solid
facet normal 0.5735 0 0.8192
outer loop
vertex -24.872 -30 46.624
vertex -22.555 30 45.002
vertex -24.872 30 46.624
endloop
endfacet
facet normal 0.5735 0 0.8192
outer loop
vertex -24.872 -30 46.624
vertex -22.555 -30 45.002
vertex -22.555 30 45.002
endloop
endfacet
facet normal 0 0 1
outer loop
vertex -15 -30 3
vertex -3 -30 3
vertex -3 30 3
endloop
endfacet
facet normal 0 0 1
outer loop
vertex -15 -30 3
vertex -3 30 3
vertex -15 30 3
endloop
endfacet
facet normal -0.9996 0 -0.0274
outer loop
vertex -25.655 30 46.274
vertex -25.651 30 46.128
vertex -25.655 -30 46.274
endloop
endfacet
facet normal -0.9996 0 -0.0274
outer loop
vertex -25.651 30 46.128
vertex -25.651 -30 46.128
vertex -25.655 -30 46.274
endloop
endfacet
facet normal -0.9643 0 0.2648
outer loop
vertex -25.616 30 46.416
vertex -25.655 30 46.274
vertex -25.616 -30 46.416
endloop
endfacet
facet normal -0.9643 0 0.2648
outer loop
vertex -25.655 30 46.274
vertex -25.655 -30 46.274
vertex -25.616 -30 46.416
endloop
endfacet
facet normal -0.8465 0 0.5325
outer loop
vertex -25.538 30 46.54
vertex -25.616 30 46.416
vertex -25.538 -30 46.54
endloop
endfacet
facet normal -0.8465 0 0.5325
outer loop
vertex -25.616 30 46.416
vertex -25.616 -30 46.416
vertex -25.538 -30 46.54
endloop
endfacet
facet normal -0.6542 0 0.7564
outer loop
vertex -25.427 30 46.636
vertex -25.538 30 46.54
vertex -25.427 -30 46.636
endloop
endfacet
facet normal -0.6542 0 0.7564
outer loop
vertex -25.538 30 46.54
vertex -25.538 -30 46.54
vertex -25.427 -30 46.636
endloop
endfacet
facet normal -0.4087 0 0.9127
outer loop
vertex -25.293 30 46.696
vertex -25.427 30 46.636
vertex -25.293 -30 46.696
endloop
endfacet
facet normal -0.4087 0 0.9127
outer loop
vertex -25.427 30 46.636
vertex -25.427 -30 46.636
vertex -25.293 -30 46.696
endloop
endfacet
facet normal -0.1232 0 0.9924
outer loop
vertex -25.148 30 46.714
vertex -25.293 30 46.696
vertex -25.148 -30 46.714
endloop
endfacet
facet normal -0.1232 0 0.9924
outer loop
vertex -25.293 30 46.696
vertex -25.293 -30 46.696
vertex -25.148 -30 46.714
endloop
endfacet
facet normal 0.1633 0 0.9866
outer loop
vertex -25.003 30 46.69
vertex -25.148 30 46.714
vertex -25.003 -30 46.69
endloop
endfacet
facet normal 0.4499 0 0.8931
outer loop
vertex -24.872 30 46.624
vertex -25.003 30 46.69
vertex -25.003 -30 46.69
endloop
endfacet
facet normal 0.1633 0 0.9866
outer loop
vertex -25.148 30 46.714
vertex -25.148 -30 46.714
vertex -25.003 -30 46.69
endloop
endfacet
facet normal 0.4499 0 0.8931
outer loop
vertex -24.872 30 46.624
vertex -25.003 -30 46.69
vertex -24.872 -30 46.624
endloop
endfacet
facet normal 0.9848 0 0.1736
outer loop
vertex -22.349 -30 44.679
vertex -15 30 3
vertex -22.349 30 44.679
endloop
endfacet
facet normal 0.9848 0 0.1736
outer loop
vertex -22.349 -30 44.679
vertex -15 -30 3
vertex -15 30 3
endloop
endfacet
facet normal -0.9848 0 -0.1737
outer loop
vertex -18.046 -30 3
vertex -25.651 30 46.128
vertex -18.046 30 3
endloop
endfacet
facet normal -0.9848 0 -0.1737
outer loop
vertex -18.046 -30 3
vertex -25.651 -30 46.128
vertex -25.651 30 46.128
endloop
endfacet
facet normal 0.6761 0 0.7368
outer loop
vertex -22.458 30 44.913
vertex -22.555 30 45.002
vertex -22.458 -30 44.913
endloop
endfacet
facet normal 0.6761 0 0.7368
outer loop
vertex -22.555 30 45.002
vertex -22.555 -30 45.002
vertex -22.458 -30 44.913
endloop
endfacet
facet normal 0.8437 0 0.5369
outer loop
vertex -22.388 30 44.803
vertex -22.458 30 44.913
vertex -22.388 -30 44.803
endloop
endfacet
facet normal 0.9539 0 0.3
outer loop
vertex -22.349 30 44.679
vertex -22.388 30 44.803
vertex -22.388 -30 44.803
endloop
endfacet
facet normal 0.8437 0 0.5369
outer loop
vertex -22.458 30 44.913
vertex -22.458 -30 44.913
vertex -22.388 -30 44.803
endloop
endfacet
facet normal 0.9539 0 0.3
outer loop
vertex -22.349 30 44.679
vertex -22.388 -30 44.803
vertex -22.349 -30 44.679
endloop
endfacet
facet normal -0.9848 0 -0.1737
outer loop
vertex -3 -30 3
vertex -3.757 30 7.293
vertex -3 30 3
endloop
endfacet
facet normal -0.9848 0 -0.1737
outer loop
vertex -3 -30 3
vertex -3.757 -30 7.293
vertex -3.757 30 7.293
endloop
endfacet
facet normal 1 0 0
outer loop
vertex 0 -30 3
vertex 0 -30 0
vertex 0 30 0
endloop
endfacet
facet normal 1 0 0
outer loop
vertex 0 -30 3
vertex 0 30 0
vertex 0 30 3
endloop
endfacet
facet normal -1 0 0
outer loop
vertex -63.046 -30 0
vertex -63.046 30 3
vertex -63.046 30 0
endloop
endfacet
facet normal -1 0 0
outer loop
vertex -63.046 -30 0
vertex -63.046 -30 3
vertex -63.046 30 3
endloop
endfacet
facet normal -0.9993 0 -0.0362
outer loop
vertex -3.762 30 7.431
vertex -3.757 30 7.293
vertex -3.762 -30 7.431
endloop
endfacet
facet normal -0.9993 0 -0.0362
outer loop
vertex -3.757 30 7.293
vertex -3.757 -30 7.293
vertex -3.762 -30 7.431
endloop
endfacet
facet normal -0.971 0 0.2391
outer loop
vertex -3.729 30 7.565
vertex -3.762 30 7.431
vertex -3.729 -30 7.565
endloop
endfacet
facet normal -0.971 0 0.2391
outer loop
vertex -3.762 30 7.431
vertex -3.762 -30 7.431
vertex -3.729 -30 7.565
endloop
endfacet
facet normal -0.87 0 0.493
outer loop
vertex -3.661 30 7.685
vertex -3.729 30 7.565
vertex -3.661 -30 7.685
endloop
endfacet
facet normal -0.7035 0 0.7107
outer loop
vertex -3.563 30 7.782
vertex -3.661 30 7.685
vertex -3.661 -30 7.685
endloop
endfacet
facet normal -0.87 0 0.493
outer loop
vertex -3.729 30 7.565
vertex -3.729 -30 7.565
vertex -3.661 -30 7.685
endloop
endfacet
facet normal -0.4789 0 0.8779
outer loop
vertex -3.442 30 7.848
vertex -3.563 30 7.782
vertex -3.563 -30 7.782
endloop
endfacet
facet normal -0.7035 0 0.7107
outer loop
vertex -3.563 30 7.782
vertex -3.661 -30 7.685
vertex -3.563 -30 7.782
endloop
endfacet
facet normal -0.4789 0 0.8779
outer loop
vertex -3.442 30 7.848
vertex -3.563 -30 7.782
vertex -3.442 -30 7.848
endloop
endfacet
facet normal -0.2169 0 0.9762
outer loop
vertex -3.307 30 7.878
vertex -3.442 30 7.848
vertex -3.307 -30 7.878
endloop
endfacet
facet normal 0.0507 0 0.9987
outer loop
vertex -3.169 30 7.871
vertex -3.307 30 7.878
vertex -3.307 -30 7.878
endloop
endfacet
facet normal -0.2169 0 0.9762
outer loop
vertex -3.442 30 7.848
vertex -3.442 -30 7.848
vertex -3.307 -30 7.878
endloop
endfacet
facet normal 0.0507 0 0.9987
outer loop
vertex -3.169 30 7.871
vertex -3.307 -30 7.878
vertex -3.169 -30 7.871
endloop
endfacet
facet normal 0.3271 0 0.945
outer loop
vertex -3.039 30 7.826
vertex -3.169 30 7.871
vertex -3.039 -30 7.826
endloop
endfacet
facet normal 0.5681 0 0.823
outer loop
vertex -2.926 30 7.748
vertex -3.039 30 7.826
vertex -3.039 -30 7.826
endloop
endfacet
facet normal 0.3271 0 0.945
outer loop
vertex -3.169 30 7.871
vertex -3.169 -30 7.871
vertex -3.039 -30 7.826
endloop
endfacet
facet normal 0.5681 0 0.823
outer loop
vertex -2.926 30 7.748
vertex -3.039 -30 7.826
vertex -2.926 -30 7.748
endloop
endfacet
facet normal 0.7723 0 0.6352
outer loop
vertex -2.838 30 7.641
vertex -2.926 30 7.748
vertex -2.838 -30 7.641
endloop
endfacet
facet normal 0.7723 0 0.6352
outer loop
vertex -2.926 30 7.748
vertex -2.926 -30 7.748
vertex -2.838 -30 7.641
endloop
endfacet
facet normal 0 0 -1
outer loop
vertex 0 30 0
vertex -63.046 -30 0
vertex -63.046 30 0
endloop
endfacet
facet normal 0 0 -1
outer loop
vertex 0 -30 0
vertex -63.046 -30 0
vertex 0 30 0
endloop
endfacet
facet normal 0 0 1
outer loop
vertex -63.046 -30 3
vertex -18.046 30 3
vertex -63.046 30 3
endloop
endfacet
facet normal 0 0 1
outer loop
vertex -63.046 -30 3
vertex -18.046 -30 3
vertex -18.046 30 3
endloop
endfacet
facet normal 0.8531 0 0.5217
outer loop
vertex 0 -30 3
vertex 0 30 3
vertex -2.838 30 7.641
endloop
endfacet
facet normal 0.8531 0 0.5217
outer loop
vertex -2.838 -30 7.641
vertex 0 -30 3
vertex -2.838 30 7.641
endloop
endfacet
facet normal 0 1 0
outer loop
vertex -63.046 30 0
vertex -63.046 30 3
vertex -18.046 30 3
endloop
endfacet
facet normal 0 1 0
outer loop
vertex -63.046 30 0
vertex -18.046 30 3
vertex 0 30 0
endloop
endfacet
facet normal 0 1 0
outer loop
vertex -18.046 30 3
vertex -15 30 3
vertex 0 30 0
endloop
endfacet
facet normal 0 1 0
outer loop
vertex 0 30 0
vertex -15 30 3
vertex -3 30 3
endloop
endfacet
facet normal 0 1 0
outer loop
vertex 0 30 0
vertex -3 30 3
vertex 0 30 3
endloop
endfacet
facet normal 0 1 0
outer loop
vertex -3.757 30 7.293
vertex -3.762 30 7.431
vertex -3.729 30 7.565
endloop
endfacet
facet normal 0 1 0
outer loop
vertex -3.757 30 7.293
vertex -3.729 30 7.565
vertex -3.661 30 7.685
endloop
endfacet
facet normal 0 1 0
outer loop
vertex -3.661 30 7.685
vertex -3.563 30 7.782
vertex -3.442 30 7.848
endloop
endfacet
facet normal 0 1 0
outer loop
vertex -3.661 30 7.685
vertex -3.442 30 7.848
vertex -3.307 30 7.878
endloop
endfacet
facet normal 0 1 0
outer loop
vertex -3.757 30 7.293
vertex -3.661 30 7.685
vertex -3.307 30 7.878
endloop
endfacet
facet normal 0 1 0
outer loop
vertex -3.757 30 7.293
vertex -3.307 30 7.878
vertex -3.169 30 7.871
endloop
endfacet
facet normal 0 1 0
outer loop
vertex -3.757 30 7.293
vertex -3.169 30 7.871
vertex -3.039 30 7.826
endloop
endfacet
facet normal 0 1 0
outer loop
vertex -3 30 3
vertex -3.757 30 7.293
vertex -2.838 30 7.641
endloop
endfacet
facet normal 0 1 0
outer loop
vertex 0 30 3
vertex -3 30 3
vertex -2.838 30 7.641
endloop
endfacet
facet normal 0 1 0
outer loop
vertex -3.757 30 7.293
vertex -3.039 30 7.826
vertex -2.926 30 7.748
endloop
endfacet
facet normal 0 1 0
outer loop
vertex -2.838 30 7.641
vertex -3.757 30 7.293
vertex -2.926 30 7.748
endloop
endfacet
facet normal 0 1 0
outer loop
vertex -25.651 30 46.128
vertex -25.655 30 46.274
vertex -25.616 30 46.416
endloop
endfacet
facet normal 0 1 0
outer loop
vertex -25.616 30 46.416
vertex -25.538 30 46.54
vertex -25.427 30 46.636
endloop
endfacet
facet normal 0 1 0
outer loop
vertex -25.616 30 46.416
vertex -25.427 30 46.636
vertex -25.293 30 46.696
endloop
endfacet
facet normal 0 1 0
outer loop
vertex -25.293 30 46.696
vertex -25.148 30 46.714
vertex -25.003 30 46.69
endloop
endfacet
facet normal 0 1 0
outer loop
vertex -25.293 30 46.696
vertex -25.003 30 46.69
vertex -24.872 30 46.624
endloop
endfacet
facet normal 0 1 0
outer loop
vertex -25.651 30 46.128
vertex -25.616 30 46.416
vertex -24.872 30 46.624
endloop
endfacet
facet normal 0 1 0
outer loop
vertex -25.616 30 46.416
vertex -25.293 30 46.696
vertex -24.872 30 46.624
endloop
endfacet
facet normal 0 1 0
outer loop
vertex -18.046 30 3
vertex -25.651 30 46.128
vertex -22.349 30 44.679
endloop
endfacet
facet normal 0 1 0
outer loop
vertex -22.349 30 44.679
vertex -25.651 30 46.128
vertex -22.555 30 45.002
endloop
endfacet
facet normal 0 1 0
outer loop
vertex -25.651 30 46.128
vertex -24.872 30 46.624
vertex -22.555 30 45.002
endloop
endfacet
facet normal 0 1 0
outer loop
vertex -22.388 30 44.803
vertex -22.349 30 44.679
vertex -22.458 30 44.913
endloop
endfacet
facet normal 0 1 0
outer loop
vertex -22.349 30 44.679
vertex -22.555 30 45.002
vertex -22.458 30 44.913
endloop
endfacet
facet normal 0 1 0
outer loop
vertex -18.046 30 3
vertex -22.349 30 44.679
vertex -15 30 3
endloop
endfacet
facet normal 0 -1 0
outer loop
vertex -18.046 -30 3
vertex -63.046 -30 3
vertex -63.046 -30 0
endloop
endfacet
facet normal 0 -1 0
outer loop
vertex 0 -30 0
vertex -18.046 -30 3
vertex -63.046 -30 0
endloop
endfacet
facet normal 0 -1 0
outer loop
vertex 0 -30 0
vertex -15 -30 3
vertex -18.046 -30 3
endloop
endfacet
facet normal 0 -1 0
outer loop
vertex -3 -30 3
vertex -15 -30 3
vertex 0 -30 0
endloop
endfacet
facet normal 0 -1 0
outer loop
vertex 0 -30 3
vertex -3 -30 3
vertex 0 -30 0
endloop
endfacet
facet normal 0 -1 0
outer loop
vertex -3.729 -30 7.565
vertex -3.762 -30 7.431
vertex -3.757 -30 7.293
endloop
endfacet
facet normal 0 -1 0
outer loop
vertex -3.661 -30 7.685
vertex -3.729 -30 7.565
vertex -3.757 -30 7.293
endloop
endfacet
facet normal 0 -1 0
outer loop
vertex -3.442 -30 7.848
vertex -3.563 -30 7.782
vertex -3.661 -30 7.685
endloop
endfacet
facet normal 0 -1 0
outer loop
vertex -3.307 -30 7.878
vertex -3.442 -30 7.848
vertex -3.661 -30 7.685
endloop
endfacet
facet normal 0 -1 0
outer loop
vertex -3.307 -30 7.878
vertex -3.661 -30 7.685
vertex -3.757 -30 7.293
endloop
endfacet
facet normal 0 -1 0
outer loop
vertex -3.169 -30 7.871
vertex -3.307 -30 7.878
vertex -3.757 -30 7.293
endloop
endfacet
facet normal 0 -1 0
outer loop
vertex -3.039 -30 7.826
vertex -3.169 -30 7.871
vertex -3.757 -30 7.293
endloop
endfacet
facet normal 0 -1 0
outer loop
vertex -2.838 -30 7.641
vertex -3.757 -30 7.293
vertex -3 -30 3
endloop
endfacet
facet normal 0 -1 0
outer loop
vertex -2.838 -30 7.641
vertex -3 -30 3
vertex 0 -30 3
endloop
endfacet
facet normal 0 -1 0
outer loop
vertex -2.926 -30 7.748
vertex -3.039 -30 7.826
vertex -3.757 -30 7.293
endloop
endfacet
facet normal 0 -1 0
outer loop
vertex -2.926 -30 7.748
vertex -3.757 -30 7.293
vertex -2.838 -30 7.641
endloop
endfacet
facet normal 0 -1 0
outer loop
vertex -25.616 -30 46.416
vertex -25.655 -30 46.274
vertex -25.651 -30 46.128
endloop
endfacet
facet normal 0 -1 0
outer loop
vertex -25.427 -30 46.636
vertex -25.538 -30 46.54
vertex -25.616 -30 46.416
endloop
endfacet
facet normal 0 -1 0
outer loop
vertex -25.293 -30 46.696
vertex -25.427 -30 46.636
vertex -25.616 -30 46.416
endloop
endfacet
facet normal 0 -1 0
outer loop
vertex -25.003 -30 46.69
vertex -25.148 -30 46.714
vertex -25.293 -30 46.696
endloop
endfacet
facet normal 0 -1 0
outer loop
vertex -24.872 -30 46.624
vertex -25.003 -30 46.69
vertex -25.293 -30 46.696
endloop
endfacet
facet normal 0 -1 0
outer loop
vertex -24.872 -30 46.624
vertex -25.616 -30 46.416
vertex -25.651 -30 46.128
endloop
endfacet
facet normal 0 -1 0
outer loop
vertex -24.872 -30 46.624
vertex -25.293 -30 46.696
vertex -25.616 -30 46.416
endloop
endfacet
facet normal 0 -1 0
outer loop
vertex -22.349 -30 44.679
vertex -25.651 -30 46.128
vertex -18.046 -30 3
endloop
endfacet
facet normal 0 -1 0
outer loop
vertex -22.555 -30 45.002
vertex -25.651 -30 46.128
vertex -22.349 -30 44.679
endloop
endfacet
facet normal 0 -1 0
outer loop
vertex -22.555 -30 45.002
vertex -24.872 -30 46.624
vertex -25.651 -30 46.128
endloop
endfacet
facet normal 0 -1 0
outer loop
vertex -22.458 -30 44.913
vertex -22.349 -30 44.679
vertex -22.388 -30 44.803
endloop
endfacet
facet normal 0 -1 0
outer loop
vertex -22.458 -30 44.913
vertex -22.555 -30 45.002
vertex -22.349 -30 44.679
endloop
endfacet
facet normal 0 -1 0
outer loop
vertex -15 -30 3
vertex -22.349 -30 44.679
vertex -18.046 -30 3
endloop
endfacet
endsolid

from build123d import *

# Parameters (mm, degrees)
F1_DEPTH = 30
F2_R     = 0.5


with BuildPart() as f1:
    # F0 (on Front) → F1 (new body, symmetric)
    with BuildSketch(Plane.XZ):
        Polygon((-63.04628, 0), (0, 0), (0, 3), (-4.215537, 9.893654), (-3, 3), (-15, 3), (-22.38508, 44.88287), (-25.860448, 47.316349), (-18.04628, 3), (-63.04628, 3), align=None)
    extrude(amount=F1_DEPTH, both=True)

    # F2
    f2_edges = [f1.edges().sort_by_distance(p)[0] for p in [
        (-22.38508, 0, 44.88287),
        (-4.215537, 0, 9.893654),
        (-25.860448, 0, 47.316349),
    ]]
    fillet(f2_edges, radius=F2_R)


solid = f1.part
